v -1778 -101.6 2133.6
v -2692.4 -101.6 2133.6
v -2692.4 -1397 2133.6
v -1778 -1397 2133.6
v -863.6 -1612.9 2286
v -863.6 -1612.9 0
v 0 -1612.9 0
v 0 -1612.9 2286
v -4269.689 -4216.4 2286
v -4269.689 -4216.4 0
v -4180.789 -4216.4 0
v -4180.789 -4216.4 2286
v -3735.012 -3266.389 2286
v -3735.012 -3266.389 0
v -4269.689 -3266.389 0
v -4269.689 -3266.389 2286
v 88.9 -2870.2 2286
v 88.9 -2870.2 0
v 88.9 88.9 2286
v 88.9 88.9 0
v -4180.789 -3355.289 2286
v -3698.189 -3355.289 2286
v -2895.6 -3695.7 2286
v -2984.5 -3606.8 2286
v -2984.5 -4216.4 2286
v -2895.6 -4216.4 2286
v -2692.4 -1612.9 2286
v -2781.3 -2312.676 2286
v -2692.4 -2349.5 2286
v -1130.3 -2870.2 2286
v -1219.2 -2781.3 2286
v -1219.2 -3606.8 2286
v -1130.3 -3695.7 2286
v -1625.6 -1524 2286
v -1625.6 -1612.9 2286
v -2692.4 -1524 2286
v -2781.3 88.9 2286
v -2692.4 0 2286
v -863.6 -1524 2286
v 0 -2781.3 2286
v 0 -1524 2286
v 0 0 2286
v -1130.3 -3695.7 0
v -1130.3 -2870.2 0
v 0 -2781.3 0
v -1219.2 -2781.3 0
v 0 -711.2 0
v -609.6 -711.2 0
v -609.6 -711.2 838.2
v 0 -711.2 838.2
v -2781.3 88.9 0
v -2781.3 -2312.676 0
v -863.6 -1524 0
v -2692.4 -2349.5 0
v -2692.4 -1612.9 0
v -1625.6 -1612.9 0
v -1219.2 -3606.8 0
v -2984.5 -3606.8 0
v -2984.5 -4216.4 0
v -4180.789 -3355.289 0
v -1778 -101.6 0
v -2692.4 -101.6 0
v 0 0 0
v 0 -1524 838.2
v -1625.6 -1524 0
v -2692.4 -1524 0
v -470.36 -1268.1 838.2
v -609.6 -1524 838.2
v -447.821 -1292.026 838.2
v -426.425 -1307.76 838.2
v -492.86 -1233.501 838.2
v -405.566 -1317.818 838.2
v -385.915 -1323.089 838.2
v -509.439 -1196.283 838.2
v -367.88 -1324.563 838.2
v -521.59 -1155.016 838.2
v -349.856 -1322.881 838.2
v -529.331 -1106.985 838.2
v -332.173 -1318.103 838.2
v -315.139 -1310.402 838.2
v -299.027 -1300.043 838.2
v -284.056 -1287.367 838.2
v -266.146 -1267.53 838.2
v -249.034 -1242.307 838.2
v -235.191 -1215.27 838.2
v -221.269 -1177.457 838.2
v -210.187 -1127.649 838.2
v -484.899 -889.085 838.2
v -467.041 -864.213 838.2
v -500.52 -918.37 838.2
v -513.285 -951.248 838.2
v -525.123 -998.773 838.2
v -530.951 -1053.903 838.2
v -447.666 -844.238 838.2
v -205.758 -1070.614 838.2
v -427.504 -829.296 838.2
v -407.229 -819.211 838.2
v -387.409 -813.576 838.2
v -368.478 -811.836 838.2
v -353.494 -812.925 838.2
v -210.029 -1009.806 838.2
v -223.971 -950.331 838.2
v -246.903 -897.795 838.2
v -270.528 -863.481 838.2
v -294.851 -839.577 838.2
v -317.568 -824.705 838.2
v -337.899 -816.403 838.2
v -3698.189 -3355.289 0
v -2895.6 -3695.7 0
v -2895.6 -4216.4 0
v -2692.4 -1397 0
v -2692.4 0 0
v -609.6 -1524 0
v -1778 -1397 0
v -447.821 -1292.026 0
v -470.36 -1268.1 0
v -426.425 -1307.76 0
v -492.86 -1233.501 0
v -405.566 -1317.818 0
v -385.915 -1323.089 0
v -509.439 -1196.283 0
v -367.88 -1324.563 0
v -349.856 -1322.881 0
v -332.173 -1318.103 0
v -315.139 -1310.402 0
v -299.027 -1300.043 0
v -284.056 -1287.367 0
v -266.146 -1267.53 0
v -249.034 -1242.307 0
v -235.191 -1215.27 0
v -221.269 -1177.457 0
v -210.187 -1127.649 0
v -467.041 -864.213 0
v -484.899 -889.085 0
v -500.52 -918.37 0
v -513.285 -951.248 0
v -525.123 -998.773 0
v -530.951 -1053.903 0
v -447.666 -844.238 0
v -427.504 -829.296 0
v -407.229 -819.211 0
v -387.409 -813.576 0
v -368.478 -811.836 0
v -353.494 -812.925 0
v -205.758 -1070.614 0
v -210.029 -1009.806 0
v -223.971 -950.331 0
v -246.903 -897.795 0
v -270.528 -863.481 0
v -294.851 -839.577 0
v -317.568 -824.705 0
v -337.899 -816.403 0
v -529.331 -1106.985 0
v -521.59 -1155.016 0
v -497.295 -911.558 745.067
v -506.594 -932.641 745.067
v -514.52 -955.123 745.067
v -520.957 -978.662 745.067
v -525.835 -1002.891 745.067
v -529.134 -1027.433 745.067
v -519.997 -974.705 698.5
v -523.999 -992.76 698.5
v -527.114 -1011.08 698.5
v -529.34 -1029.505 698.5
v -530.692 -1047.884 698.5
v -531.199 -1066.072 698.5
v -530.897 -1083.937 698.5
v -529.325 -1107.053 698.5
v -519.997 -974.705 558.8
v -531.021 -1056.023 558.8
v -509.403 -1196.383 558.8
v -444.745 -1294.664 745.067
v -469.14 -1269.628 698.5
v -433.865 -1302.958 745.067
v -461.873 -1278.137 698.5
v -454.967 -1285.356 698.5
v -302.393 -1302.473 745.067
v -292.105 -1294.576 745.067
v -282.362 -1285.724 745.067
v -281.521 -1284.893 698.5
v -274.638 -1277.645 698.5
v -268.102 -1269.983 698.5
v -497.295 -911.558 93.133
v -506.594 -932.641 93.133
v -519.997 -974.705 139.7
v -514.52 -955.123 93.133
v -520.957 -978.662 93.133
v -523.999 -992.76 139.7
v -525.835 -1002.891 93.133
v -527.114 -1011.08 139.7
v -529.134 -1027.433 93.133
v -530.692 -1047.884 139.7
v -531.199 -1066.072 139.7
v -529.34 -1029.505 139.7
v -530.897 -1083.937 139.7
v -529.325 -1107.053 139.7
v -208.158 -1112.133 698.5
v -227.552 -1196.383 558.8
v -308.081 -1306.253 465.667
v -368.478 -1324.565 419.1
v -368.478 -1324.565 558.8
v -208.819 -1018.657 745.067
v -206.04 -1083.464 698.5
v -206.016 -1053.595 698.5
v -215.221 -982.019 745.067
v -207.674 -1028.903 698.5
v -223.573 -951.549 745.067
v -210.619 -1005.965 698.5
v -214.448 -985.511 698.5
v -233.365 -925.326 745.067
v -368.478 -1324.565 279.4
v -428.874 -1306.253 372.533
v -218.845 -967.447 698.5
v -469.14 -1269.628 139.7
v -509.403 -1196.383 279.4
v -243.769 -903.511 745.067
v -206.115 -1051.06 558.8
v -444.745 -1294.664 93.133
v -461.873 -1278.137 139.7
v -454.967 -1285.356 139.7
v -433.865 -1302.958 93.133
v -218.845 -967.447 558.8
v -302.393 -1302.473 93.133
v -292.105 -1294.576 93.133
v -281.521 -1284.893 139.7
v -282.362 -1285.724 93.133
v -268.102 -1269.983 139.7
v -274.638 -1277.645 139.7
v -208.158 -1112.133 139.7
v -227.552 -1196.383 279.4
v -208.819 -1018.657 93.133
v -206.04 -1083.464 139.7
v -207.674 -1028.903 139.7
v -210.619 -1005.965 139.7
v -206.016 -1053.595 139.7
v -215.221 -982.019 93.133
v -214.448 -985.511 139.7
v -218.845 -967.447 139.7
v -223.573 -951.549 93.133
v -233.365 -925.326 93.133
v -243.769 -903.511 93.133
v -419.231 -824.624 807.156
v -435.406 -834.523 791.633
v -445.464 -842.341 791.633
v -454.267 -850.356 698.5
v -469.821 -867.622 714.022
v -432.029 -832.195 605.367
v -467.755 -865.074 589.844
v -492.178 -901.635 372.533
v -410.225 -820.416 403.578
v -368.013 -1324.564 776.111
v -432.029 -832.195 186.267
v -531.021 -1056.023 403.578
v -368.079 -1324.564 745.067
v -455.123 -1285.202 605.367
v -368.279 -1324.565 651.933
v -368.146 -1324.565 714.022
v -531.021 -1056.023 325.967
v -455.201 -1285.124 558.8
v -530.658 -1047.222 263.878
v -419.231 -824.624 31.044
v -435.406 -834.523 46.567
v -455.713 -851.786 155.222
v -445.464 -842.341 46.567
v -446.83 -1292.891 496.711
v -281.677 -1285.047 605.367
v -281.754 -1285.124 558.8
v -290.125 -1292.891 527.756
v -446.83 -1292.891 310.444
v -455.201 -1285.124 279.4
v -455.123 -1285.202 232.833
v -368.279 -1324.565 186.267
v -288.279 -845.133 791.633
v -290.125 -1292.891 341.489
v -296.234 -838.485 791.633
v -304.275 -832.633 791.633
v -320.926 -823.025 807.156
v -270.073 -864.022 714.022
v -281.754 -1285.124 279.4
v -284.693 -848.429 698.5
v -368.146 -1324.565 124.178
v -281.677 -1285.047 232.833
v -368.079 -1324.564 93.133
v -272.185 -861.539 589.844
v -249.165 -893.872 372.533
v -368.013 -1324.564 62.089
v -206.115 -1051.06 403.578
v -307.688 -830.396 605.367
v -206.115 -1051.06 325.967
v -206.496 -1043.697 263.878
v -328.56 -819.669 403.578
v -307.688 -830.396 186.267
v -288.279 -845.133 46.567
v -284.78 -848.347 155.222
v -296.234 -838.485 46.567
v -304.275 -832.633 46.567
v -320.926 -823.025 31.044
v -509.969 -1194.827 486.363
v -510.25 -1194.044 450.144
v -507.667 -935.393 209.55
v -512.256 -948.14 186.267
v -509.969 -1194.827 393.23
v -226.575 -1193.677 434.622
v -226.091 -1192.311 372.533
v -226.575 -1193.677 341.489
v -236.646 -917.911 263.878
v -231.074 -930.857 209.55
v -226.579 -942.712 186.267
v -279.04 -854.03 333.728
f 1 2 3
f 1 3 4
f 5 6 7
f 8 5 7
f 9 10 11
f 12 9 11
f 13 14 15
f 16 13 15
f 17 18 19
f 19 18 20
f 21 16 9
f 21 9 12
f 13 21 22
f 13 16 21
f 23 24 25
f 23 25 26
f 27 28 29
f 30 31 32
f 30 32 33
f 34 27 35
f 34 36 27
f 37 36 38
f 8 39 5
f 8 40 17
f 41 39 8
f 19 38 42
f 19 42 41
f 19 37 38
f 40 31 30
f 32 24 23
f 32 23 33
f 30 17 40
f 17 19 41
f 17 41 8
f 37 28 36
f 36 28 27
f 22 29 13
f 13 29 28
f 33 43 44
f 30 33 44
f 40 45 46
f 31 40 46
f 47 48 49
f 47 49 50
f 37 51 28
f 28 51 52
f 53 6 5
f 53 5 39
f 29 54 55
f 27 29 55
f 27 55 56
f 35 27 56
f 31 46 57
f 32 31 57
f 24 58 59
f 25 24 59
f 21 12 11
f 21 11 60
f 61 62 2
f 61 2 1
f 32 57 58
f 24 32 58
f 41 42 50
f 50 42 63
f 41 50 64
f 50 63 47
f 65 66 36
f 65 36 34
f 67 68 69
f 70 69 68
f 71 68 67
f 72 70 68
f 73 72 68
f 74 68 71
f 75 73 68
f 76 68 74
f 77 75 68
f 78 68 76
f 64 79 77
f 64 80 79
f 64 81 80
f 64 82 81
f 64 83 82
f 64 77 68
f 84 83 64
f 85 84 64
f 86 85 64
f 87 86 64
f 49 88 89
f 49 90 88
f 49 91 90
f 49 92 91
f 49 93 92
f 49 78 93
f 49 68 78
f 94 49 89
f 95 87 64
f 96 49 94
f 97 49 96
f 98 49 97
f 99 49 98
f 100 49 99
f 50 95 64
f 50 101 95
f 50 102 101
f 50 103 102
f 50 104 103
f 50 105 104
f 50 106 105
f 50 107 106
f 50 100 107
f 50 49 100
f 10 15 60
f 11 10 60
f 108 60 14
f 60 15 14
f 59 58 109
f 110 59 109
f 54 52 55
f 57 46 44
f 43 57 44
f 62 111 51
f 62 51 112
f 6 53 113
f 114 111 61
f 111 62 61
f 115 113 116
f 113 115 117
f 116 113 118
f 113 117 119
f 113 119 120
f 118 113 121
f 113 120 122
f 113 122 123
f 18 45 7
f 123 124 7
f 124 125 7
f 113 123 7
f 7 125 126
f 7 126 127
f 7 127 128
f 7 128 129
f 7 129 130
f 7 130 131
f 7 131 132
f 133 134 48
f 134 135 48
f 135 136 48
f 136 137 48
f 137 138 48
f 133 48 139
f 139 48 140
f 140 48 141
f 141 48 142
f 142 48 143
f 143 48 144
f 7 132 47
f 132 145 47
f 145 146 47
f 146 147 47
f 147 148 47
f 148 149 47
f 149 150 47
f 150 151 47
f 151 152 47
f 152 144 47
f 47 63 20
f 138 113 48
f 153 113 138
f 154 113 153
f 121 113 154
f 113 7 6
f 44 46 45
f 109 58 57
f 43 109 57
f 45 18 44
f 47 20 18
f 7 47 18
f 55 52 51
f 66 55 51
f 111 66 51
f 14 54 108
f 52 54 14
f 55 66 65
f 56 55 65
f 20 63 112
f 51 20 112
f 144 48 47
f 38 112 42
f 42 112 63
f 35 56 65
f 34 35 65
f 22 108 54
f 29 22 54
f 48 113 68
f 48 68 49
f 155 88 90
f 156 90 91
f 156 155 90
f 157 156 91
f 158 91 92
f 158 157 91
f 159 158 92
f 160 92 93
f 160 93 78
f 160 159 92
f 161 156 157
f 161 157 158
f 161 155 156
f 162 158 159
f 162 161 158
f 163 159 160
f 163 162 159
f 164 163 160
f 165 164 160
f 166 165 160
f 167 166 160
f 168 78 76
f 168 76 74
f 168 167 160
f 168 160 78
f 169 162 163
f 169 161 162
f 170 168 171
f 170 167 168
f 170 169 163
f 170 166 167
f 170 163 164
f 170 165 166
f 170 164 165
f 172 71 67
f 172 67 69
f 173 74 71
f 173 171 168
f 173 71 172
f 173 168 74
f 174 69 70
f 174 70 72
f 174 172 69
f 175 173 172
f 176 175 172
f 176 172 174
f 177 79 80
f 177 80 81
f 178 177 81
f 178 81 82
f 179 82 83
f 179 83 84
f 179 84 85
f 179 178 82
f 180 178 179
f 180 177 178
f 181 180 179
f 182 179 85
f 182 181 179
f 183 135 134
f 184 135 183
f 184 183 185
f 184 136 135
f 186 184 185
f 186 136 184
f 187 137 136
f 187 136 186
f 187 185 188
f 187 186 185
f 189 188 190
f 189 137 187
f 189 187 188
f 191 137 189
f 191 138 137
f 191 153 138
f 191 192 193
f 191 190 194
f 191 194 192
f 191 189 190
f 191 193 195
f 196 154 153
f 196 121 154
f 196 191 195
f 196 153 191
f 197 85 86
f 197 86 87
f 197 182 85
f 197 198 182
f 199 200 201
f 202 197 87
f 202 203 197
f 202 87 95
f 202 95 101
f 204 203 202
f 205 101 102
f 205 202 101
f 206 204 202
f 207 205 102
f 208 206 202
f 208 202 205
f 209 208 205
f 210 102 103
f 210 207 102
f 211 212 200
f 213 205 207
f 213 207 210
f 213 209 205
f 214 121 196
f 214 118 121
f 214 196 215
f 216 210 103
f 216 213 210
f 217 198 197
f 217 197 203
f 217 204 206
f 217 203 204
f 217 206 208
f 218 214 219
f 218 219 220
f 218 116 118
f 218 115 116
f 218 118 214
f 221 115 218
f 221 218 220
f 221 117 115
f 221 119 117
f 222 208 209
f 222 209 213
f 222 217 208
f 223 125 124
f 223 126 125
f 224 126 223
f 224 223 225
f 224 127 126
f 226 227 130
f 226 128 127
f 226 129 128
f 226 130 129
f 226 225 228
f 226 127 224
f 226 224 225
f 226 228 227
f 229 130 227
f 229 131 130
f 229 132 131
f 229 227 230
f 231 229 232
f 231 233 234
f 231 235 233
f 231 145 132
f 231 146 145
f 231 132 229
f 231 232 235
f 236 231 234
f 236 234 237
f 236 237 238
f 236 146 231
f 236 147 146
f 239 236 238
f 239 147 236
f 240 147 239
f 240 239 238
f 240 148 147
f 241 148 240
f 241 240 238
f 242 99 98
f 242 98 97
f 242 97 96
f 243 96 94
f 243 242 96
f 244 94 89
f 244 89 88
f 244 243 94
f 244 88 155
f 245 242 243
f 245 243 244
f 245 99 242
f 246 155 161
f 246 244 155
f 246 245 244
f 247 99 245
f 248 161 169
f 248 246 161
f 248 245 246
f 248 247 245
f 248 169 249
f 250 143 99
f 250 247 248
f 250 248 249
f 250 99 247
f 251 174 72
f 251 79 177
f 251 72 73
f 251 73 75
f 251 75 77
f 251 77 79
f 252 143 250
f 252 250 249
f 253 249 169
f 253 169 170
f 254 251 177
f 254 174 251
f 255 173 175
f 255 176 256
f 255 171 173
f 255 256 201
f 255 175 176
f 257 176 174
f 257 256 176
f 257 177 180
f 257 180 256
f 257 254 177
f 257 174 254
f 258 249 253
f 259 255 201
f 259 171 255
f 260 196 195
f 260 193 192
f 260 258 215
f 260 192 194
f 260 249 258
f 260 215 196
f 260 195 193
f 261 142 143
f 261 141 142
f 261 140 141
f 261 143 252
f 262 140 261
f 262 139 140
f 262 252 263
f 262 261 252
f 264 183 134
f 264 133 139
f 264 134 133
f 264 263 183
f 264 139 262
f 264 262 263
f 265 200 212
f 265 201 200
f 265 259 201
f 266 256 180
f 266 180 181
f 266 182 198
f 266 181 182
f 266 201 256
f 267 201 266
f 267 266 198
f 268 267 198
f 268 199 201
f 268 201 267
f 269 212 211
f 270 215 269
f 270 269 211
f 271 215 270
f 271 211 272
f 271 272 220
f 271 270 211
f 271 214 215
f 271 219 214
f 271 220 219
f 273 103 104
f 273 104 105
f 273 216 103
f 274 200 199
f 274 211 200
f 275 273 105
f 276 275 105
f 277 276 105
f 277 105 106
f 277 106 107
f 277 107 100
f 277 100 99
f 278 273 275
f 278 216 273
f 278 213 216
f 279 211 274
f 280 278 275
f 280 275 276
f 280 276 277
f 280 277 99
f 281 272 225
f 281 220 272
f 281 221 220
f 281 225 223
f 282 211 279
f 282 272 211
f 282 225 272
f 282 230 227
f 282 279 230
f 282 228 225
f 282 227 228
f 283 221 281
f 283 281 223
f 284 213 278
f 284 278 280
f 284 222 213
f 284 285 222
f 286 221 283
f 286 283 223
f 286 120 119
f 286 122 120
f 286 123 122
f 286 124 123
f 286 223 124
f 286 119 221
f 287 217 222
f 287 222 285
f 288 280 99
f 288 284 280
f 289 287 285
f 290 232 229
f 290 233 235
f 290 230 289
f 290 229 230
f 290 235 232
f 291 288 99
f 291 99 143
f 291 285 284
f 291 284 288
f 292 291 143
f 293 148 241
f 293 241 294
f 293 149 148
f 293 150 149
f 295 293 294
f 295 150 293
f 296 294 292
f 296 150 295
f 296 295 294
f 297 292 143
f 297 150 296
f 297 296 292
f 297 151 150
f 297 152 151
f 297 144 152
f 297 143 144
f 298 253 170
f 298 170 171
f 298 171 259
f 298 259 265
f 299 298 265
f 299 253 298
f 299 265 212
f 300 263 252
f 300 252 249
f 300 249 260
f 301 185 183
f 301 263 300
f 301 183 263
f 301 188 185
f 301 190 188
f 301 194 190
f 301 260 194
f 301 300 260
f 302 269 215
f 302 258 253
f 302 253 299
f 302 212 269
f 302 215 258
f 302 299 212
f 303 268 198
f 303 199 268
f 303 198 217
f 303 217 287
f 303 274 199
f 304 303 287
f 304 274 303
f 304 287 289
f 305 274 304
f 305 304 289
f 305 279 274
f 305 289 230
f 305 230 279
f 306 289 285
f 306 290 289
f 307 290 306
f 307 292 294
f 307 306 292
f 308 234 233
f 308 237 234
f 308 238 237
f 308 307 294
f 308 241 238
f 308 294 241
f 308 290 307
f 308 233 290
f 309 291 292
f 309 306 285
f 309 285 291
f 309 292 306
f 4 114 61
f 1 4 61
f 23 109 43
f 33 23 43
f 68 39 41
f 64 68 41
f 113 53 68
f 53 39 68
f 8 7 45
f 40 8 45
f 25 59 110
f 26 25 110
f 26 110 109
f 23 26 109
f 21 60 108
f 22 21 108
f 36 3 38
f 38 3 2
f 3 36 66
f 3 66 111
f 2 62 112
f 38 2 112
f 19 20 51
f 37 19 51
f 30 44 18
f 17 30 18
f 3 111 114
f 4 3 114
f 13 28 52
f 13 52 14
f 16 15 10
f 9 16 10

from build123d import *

# Parameters (mm, degrees)
F1_DEPTH = 2286
F4_W     = 863.6
F4_H     = 88.9
F4_W_2   = 1066.8
F5_DEPTH = 2286
F2_W     = 914.4
F2_H     = 1295.4
F6_DEPTH = 2133.6
F3_W     = 609.6
F3_H     = 812.8
F7_DEPTH = 838.2


with BuildPart() as f1:
    # F0 (on Top) → F1 (new body)
    with BuildSketch(Plane.XY):
        Polygon((-2692.4, 0), (0, 0), (0, -2781.3), (-1219.2, -2781.3), (-1219.2, -3606.8), (-2984.5, -3606.8), (-2984.5, -4216.4), (-2895.6, -4216.4), (-2895.6, -3695.7), (-1130.3, -3695.7), (-1130.3, -2870.2), (88.9, -2870.2), (88.9, 88.9), (-2781.3, 88.9), (-2781.3, -2312.676414305), (-3735.0122712547, -3266.3886855597), (-4269.6886855597, -3266.3886855597), (-4269.6886855597, -4216.4), (-4180.7886855597, -4216.4), (-4180.7886855597, -3355.2886855597), (-3698.1886855597, -3355.2886855597), (-2692.4, -2349.5), align=None)
    extrude(amount=F1_DEPTH)

    # F4 (on Top) → F5 (join)
    with BuildSketch(Plane.XY):
        with Locations((-431.8, -1568.45)):
            Rectangle(F4_W, F4_H)
        with Locations((-2159, -1568.45)):
            Rectangle(F4_W_2, F4_H)
    extrude(amount=F5_DEPTH)

    # F2 (on Top) → F6 (join)
    with BuildSketch(Plane.XY):
        with Locations((-2235.2, -749.3)):
            Rectangle(F2_W, F2_H)
    extrude(amount=F6_DEPTH)

    # F3 (on Top) → F7 (join)
    with BuildSketch(Plane.XY):
        with Locations((-304.8, -1117.6)):
            Rectangle(F3_W, F3_H)
        with BuildLine():
            add(Edge.make_bspline(
                [(-368.4777021408, -811.8355870247), (-650.3282199706, -811.8355870247), (-509.4029610557, -1196.3827311993), (-368.4777021408, -1580.9298753738), (-227.5524432259, -1196.3827311993), (-86.627184311, -811.8355870247), (-368.4777021408, -811.8355870247)],
                knots=[0, 0, 0, 2.0943951024, 2.0943951024, 4.1887902048, 4.1887902048, 6.2831853072, 6.2831853072, 6.2831853072], degree=2, weights=[1, 0.5, 1, 0.5, 1, 0.5, 1]))
        make_face(mode=Mode.SUBTRACT)
    extrude(amount=F7_DEPTH)


solid = f1.part
